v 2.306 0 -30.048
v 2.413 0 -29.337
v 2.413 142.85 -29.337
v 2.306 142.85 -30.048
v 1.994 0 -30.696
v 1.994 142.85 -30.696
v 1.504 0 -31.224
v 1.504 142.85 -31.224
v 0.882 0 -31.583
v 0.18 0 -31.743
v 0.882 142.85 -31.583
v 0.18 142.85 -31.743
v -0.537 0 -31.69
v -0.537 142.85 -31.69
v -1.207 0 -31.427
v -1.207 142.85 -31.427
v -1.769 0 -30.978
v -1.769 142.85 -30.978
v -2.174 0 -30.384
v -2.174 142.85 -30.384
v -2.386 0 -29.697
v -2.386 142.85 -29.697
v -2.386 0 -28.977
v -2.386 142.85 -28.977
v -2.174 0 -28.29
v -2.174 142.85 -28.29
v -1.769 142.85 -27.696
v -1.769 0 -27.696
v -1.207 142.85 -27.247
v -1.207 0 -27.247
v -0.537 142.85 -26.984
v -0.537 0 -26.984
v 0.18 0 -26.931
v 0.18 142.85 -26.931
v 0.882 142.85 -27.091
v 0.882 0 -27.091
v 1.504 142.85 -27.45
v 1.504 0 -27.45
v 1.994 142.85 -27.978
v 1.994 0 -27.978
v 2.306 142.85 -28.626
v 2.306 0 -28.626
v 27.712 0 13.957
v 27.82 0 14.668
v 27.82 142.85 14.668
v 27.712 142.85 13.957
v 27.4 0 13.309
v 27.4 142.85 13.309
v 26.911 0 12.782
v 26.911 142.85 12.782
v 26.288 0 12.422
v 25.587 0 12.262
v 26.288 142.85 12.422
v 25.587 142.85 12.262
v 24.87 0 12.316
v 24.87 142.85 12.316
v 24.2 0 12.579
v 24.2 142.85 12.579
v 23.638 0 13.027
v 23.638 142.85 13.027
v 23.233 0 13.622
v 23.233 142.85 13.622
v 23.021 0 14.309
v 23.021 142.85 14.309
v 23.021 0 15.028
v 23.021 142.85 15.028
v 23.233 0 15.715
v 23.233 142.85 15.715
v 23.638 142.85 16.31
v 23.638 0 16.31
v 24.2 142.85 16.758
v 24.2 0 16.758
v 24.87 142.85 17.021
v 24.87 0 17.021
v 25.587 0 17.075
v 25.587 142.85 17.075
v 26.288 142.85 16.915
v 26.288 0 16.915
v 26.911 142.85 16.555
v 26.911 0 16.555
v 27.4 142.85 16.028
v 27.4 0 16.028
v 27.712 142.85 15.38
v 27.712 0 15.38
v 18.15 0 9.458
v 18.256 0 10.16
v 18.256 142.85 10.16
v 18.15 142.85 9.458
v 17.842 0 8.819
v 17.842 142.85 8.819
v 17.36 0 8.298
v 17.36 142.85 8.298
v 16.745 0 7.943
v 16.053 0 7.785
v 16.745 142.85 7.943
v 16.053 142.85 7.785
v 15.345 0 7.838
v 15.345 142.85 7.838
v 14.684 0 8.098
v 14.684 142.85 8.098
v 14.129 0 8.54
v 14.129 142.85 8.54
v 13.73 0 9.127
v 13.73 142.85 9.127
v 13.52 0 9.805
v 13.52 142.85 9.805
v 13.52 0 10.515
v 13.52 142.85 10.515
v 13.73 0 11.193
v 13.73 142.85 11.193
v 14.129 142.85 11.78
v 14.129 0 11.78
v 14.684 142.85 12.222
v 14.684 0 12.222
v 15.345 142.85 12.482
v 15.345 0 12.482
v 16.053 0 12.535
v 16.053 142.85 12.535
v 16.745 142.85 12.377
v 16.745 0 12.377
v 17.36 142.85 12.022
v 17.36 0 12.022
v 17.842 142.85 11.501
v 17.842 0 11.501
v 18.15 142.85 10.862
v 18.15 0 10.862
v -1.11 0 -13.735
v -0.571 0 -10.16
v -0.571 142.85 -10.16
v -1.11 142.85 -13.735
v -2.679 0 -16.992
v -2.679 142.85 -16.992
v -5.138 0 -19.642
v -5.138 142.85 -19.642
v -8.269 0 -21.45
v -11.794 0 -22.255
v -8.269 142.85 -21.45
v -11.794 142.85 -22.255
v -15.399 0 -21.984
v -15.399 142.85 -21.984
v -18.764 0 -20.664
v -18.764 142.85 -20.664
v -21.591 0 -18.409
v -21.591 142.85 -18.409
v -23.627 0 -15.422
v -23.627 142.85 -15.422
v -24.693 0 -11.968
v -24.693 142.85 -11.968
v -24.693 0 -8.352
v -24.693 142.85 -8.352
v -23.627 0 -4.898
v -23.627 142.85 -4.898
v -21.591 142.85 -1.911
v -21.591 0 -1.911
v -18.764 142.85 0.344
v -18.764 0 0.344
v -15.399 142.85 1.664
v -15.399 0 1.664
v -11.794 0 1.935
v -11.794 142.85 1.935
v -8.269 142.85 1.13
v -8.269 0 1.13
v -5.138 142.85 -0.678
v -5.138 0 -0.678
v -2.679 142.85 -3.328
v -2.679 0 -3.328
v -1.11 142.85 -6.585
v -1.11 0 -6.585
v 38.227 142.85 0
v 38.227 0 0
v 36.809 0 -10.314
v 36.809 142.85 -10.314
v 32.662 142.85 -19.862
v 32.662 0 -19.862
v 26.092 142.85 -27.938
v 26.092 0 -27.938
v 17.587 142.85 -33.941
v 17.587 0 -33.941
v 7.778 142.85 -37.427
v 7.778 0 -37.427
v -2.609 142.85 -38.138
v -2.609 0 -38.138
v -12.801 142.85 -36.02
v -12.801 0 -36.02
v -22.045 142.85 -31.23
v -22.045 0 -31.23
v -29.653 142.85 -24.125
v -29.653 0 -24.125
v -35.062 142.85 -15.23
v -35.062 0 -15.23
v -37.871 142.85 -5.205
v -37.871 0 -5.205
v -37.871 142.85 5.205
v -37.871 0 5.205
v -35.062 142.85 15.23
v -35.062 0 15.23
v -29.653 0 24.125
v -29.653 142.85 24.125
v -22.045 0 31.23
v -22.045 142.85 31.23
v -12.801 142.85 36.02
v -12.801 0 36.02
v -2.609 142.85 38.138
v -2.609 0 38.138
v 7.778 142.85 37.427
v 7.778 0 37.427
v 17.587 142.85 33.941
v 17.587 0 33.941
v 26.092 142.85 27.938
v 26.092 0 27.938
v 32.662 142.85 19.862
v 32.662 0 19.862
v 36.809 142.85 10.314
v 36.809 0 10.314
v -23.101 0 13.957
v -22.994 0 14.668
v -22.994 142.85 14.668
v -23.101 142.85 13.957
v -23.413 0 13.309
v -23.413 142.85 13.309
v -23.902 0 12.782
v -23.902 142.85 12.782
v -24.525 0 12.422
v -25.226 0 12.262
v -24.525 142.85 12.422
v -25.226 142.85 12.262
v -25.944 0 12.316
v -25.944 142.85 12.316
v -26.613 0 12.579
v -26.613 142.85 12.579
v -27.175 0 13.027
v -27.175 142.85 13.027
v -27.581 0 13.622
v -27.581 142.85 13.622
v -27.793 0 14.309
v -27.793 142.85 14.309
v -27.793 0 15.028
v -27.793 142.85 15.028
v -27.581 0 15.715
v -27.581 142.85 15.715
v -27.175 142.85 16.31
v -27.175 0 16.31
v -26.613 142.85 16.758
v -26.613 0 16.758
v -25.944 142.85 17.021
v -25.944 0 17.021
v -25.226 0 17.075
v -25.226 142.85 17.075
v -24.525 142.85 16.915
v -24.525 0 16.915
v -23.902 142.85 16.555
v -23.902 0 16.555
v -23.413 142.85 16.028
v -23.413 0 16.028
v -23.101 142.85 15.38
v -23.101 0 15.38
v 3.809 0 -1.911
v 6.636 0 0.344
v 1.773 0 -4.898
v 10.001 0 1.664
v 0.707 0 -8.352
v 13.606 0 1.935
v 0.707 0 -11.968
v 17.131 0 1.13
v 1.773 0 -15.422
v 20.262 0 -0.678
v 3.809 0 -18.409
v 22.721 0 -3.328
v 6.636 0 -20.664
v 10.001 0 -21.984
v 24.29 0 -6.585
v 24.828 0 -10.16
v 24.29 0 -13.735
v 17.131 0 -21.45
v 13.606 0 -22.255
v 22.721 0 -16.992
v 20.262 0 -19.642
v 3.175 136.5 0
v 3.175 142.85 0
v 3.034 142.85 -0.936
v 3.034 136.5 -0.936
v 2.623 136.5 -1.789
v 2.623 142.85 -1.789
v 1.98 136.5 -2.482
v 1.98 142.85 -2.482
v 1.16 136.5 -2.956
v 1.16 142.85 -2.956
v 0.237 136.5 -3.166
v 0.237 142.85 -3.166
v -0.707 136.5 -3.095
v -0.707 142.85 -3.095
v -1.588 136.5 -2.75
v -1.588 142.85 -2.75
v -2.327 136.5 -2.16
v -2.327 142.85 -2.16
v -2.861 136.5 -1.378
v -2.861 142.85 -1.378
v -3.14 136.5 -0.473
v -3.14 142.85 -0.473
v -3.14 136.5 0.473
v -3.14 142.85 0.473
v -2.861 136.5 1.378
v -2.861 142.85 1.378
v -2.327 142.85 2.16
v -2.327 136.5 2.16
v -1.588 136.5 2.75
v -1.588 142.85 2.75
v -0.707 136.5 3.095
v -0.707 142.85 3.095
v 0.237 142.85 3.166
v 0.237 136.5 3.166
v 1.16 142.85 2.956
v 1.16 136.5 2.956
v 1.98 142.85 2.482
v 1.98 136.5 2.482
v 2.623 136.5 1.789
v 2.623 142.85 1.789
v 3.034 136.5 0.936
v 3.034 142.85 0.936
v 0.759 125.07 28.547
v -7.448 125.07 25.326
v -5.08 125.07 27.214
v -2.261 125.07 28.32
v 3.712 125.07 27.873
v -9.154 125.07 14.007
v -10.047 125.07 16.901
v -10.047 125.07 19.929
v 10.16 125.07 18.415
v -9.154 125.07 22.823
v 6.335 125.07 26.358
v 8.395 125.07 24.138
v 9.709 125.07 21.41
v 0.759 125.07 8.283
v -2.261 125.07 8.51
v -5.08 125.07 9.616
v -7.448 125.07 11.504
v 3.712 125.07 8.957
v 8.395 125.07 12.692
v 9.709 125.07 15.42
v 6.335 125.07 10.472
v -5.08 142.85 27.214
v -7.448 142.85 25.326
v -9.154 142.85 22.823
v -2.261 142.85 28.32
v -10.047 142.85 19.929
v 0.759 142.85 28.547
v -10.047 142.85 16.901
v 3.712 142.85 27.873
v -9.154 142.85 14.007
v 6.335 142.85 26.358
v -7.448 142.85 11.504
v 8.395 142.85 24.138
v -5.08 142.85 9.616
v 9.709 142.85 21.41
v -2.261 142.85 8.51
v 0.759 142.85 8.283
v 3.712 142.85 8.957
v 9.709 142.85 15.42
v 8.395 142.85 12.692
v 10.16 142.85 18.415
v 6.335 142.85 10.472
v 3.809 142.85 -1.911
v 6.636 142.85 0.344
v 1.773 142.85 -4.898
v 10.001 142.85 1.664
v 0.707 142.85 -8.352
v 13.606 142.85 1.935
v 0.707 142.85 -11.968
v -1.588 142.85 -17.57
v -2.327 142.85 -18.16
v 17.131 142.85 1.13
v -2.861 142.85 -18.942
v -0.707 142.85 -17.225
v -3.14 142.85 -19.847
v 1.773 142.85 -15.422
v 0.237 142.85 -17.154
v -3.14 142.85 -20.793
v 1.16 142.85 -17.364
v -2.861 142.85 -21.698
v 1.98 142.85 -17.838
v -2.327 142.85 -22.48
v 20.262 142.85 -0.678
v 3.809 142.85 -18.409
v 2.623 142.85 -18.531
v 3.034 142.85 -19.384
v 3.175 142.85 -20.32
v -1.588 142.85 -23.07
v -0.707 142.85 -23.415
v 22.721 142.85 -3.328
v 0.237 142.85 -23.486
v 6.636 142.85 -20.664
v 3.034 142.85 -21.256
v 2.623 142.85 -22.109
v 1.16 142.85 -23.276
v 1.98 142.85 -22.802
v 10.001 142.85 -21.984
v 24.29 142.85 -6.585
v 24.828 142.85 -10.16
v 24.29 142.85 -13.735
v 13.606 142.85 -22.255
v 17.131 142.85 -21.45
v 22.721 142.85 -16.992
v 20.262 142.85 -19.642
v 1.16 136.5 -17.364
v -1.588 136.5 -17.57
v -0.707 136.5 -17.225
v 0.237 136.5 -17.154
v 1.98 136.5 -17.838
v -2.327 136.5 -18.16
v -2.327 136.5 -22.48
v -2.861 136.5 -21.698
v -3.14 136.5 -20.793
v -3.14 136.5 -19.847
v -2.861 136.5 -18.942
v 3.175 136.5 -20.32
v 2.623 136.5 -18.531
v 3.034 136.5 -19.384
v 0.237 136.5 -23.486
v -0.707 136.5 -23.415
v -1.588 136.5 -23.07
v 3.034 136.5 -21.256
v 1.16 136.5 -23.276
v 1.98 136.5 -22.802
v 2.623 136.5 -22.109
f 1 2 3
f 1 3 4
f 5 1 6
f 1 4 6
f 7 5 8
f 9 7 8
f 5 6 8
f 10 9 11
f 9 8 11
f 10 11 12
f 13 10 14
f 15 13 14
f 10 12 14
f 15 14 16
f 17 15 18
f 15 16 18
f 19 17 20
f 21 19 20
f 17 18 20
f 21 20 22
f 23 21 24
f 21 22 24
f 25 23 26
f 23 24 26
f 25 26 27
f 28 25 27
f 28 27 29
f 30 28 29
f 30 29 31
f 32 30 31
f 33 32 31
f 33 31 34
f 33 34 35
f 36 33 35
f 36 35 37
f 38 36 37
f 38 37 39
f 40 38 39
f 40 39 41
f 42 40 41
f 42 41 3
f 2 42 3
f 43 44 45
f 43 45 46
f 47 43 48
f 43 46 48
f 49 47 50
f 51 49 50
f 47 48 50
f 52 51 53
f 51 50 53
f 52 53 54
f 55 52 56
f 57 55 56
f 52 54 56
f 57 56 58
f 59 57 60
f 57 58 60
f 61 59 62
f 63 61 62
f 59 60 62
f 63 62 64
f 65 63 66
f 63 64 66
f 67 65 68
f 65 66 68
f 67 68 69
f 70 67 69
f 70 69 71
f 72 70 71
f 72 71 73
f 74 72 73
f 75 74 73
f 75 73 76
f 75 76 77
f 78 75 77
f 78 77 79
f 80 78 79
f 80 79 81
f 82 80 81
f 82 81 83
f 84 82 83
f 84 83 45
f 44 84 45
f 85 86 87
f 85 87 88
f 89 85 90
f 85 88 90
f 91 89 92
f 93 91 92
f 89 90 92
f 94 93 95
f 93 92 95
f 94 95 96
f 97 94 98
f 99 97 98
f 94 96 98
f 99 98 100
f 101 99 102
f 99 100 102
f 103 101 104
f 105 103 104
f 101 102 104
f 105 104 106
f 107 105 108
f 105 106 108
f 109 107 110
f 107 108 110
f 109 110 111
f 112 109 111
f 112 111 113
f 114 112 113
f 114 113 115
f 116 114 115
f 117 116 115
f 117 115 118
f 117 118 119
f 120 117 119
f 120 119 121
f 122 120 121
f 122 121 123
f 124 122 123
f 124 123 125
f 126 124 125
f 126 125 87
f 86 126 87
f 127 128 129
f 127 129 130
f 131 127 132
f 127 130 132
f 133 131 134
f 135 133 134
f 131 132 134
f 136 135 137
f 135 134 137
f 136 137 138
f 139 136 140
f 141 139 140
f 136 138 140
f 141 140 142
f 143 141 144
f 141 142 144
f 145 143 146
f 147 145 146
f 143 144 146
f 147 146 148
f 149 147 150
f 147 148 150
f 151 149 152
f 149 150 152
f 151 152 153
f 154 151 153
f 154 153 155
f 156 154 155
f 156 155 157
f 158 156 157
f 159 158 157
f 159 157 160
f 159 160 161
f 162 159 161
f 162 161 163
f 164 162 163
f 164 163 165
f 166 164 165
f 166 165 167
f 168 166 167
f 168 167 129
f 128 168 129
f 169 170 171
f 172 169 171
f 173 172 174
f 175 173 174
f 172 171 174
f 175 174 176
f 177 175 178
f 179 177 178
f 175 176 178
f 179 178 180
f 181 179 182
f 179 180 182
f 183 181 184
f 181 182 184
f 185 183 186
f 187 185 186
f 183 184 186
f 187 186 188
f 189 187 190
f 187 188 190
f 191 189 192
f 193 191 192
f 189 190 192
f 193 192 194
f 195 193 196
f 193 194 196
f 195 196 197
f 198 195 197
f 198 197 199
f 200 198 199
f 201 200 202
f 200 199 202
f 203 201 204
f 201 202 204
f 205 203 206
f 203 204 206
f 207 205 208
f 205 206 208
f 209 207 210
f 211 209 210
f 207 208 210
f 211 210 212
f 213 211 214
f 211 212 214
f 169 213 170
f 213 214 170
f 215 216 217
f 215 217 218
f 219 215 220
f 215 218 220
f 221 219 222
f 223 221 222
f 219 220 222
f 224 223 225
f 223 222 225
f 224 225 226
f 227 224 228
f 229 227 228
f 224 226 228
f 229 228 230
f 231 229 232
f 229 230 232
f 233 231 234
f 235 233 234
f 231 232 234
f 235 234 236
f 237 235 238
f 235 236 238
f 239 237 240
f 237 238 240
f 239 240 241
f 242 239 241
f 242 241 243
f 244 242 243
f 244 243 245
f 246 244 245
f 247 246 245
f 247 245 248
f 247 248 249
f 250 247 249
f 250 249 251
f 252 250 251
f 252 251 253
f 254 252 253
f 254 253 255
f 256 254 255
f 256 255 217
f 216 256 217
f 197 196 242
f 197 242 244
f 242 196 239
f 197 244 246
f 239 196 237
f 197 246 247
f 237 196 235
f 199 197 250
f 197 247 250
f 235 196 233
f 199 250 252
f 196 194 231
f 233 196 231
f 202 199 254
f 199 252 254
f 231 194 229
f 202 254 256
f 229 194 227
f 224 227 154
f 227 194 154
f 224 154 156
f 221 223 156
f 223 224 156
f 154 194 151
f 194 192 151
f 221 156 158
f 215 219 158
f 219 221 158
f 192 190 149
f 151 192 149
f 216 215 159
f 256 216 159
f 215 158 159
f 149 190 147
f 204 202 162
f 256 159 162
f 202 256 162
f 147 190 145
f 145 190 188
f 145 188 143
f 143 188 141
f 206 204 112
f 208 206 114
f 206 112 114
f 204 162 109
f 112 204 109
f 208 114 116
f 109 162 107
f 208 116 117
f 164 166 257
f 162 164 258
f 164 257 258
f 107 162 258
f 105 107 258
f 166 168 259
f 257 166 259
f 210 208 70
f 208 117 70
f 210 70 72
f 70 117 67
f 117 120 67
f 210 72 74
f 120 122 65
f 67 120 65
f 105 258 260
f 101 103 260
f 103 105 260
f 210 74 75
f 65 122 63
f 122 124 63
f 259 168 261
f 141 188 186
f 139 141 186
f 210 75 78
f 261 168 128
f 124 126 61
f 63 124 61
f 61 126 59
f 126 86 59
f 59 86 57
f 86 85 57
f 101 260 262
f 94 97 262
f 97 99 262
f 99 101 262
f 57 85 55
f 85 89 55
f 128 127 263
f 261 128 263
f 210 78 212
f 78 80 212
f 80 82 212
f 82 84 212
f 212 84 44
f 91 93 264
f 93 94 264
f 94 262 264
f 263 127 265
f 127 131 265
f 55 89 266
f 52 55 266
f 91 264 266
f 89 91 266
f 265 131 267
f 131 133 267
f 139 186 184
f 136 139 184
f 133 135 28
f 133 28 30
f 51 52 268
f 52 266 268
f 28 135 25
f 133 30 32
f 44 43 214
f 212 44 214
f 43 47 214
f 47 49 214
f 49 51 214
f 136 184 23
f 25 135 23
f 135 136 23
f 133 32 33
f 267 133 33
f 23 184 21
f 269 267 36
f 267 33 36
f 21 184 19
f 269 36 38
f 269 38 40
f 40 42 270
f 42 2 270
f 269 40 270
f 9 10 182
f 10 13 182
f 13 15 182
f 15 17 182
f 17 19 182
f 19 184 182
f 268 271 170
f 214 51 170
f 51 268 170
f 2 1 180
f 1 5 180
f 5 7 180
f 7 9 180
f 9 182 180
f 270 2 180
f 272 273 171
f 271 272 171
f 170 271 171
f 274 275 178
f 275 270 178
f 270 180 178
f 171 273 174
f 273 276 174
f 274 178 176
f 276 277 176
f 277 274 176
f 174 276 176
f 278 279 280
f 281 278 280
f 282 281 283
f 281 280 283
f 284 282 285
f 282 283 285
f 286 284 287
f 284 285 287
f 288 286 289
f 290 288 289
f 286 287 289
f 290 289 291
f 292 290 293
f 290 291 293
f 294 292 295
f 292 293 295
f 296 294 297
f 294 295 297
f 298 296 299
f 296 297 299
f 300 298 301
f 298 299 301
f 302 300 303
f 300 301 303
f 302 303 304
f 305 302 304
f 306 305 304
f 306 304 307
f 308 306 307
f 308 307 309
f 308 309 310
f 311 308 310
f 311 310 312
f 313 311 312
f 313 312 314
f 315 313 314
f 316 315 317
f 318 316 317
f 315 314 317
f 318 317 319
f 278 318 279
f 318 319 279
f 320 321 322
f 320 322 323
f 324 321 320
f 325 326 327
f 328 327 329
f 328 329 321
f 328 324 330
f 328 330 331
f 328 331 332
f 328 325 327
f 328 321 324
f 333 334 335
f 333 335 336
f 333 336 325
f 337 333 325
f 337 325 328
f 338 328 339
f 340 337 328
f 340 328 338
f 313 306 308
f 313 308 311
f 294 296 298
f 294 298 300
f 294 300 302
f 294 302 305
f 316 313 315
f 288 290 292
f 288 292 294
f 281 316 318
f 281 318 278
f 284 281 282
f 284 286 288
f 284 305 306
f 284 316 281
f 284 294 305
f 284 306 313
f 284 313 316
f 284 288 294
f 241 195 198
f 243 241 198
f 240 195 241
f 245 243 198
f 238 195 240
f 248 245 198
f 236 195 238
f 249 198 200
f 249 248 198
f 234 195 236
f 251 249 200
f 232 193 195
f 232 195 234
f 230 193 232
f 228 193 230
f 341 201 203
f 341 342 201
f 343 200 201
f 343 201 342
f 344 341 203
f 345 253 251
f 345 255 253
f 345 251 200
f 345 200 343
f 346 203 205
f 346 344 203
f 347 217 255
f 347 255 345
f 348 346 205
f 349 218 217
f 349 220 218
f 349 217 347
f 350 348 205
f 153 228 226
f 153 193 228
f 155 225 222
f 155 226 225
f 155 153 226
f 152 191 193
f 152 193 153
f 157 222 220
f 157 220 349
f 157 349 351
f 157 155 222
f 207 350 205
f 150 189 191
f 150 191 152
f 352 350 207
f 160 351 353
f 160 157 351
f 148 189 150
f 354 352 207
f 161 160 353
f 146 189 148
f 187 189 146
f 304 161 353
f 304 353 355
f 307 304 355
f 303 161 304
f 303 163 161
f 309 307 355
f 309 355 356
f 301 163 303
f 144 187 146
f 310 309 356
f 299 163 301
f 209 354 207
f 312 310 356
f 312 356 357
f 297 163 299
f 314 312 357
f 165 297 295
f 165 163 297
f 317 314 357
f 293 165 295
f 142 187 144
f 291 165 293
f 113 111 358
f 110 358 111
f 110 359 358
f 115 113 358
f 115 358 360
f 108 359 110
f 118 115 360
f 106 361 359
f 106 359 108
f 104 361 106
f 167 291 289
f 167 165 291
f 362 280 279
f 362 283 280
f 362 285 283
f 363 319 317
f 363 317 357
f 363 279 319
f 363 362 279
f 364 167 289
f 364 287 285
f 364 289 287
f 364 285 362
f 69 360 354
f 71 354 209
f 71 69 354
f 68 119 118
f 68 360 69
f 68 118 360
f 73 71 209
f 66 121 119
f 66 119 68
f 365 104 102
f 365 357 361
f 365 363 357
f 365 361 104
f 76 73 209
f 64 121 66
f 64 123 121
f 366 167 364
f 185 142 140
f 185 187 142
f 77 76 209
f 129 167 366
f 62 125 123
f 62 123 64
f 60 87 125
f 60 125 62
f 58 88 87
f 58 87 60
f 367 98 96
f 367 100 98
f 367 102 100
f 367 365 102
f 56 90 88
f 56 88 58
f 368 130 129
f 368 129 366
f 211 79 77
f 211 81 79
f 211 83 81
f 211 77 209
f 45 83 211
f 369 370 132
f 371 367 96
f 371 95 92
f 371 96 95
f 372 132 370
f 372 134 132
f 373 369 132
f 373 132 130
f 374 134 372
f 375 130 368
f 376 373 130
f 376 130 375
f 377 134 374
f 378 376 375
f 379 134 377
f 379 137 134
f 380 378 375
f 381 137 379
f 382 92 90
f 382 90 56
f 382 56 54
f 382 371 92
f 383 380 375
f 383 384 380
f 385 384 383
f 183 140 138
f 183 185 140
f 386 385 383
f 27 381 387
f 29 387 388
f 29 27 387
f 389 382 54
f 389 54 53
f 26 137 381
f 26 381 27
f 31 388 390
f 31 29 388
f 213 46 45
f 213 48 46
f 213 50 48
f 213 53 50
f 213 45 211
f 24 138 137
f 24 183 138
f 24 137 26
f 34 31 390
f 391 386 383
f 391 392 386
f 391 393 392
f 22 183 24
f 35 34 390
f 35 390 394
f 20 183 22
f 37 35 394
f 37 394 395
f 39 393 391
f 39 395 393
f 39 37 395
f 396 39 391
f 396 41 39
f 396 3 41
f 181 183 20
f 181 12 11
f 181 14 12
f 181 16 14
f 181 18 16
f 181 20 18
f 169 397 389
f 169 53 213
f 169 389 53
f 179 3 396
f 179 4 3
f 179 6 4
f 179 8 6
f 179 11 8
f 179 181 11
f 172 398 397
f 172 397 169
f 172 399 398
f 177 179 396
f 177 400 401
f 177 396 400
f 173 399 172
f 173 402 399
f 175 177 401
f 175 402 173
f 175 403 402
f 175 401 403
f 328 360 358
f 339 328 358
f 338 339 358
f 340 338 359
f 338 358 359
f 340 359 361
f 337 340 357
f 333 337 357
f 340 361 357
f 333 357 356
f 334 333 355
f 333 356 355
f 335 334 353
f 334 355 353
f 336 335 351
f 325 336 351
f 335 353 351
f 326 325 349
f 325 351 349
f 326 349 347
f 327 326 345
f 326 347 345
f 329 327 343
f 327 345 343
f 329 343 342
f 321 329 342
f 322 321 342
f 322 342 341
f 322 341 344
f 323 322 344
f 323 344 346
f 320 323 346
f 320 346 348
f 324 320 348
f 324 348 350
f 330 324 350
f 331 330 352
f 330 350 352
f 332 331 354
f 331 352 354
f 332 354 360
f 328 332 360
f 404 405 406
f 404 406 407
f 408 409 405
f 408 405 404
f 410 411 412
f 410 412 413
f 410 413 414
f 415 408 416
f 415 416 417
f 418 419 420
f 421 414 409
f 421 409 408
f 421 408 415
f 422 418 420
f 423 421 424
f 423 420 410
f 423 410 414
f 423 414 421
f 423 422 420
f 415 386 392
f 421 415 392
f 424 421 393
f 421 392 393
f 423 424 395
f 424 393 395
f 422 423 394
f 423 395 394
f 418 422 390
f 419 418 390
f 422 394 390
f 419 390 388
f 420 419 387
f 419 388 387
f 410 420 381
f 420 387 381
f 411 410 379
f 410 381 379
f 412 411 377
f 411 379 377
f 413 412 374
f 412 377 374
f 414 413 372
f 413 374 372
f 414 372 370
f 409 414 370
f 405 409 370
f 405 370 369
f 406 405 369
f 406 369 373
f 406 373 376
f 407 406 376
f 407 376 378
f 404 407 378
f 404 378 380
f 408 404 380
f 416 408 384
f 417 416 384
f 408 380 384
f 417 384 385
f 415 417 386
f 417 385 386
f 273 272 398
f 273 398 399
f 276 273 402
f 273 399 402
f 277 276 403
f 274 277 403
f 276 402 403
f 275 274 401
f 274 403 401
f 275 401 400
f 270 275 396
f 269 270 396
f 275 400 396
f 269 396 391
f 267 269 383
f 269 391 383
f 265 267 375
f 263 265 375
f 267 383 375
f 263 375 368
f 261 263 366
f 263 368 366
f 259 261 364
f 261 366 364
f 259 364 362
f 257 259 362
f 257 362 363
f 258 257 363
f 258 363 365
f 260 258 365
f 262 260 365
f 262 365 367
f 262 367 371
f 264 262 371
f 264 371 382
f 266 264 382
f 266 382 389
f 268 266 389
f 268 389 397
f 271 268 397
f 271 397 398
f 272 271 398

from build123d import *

# Parameters (mm, degrees)
SKETCH1_R               = 38.227
BOSS_EXTRUDE1_DEPTH     = 142.8496
SKETCH2_R               = 2.413
CUT_EXTRUDE1_DEPTH      = 143.8496
SKETCH3_R               = 12.1285
CUT_EXTRUDE2_DEPTH      = 143.8496
SKETCH4_R               = 3.175
CUT_EXTRUDE3_DEPTH      = 6.35
SKETCH5_R               = 10.16
CUT_EXTRUDE4_DEPTH      = 17.78
SKETCH6_R               = 2.38125
CUT_EXTRUDE5_DEPTH      = 1
CUT_EXTRUDE5_DEPTH_BACK = 143.8496


with BuildPart() as part:
    # Sketch1 → Boss-Extrude1 (new body)
    with BuildSketch(Plane(origin=(0, 0, 0), x_dir=(1, 0, 0), z_dir=(0, 1, 0))):
        Circle(SKETCH1_R)
    extrude(amount=BOSS_EXTRUDE1_DEPTH)

    # Sketch2 → Cut-Extrude1 (cut, through all)
    with BuildSketch(Plane(origin=(0, 142.8496, 0), x_dir=(1, 0, 0), z_dir=(0, 1, 0))):
        with Locations((0, 29.337)):
            Circle(SKETCH2_R)
        with Locations((25.406587271, -14.6685)):
            Circle(SKETCH2_R)
        with Locations((-25.406587271, -14.6685)):
            Circle(SKETCH2_R)
    extrude(amount=-CUT_EXTRUDE1_DEPTH, mode=Mode.SUBTRACT)

    # Sketch3 → Cut-Extrude2 (cut, through all)
    with BuildSketch(Plane(origin=(0, 142.8496, 0), x_dir=(1, 0, 0), z_dir=(0, 1, 0))):
        with Locations((-12.7, 10.16)):
            Circle(SKETCH3_R)
        with Locations((12.7, 10.16)):
            Circle(SKETCH3_R)
    extrude(amount=-CUT_EXTRUDE2_DEPTH, mode=Mode.SUBTRACT)

    # Sketch4 → Cut-Extrude3 (cut)
    with BuildSketch(Plane(origin=(0, 142.8496, 0), x_dir=(1, 0, 0), z_dir=(0, 1, 0))):
        with Locations((0, 20.32)):
            Circle(SKETCH4_R)
        Circle(SKETCH4_R)
    extrude(amount=-CUT_EXTRUDE3_DEPTH, mode=Mode.SUBTRACT)

    # Sketch5 → Cut-Extrude4 (cut)
    with BuildSketch(Plane(origin=(0, 142.8496, 0), x_dir=(1, 0, 0), z_dir=(0, 1, 0))):
        with Locations((0, -18.415)):
            Circle(SKETCH5_R)
    extrude(amount=-CUT_EXTRUDE4_DEPTH, mode=Mode.SUBTRACT)

    # Sketch6 → Cut-Extrude5 (cut, two sides)
    with BuildSketch(Plane(origin=(0, 142.8496, 0), x_dir=(1, 0, 0), z_dir=(0, 1, 0))) as cut_extrude5_sk:
        with Locations((15.875, -10.16)):
            Circle(SKETCH6_R)
    extrude(amount=CUT_EXTRUDE5_DEPTH, mode=Mode.SUBTRACT)
    extrude(cut_extrude5_sk.sketch, amount=-CUT_EXTRUDE5_DEPTH_BACK, mode=Mode.SUBTRACT)


solid = part.part
